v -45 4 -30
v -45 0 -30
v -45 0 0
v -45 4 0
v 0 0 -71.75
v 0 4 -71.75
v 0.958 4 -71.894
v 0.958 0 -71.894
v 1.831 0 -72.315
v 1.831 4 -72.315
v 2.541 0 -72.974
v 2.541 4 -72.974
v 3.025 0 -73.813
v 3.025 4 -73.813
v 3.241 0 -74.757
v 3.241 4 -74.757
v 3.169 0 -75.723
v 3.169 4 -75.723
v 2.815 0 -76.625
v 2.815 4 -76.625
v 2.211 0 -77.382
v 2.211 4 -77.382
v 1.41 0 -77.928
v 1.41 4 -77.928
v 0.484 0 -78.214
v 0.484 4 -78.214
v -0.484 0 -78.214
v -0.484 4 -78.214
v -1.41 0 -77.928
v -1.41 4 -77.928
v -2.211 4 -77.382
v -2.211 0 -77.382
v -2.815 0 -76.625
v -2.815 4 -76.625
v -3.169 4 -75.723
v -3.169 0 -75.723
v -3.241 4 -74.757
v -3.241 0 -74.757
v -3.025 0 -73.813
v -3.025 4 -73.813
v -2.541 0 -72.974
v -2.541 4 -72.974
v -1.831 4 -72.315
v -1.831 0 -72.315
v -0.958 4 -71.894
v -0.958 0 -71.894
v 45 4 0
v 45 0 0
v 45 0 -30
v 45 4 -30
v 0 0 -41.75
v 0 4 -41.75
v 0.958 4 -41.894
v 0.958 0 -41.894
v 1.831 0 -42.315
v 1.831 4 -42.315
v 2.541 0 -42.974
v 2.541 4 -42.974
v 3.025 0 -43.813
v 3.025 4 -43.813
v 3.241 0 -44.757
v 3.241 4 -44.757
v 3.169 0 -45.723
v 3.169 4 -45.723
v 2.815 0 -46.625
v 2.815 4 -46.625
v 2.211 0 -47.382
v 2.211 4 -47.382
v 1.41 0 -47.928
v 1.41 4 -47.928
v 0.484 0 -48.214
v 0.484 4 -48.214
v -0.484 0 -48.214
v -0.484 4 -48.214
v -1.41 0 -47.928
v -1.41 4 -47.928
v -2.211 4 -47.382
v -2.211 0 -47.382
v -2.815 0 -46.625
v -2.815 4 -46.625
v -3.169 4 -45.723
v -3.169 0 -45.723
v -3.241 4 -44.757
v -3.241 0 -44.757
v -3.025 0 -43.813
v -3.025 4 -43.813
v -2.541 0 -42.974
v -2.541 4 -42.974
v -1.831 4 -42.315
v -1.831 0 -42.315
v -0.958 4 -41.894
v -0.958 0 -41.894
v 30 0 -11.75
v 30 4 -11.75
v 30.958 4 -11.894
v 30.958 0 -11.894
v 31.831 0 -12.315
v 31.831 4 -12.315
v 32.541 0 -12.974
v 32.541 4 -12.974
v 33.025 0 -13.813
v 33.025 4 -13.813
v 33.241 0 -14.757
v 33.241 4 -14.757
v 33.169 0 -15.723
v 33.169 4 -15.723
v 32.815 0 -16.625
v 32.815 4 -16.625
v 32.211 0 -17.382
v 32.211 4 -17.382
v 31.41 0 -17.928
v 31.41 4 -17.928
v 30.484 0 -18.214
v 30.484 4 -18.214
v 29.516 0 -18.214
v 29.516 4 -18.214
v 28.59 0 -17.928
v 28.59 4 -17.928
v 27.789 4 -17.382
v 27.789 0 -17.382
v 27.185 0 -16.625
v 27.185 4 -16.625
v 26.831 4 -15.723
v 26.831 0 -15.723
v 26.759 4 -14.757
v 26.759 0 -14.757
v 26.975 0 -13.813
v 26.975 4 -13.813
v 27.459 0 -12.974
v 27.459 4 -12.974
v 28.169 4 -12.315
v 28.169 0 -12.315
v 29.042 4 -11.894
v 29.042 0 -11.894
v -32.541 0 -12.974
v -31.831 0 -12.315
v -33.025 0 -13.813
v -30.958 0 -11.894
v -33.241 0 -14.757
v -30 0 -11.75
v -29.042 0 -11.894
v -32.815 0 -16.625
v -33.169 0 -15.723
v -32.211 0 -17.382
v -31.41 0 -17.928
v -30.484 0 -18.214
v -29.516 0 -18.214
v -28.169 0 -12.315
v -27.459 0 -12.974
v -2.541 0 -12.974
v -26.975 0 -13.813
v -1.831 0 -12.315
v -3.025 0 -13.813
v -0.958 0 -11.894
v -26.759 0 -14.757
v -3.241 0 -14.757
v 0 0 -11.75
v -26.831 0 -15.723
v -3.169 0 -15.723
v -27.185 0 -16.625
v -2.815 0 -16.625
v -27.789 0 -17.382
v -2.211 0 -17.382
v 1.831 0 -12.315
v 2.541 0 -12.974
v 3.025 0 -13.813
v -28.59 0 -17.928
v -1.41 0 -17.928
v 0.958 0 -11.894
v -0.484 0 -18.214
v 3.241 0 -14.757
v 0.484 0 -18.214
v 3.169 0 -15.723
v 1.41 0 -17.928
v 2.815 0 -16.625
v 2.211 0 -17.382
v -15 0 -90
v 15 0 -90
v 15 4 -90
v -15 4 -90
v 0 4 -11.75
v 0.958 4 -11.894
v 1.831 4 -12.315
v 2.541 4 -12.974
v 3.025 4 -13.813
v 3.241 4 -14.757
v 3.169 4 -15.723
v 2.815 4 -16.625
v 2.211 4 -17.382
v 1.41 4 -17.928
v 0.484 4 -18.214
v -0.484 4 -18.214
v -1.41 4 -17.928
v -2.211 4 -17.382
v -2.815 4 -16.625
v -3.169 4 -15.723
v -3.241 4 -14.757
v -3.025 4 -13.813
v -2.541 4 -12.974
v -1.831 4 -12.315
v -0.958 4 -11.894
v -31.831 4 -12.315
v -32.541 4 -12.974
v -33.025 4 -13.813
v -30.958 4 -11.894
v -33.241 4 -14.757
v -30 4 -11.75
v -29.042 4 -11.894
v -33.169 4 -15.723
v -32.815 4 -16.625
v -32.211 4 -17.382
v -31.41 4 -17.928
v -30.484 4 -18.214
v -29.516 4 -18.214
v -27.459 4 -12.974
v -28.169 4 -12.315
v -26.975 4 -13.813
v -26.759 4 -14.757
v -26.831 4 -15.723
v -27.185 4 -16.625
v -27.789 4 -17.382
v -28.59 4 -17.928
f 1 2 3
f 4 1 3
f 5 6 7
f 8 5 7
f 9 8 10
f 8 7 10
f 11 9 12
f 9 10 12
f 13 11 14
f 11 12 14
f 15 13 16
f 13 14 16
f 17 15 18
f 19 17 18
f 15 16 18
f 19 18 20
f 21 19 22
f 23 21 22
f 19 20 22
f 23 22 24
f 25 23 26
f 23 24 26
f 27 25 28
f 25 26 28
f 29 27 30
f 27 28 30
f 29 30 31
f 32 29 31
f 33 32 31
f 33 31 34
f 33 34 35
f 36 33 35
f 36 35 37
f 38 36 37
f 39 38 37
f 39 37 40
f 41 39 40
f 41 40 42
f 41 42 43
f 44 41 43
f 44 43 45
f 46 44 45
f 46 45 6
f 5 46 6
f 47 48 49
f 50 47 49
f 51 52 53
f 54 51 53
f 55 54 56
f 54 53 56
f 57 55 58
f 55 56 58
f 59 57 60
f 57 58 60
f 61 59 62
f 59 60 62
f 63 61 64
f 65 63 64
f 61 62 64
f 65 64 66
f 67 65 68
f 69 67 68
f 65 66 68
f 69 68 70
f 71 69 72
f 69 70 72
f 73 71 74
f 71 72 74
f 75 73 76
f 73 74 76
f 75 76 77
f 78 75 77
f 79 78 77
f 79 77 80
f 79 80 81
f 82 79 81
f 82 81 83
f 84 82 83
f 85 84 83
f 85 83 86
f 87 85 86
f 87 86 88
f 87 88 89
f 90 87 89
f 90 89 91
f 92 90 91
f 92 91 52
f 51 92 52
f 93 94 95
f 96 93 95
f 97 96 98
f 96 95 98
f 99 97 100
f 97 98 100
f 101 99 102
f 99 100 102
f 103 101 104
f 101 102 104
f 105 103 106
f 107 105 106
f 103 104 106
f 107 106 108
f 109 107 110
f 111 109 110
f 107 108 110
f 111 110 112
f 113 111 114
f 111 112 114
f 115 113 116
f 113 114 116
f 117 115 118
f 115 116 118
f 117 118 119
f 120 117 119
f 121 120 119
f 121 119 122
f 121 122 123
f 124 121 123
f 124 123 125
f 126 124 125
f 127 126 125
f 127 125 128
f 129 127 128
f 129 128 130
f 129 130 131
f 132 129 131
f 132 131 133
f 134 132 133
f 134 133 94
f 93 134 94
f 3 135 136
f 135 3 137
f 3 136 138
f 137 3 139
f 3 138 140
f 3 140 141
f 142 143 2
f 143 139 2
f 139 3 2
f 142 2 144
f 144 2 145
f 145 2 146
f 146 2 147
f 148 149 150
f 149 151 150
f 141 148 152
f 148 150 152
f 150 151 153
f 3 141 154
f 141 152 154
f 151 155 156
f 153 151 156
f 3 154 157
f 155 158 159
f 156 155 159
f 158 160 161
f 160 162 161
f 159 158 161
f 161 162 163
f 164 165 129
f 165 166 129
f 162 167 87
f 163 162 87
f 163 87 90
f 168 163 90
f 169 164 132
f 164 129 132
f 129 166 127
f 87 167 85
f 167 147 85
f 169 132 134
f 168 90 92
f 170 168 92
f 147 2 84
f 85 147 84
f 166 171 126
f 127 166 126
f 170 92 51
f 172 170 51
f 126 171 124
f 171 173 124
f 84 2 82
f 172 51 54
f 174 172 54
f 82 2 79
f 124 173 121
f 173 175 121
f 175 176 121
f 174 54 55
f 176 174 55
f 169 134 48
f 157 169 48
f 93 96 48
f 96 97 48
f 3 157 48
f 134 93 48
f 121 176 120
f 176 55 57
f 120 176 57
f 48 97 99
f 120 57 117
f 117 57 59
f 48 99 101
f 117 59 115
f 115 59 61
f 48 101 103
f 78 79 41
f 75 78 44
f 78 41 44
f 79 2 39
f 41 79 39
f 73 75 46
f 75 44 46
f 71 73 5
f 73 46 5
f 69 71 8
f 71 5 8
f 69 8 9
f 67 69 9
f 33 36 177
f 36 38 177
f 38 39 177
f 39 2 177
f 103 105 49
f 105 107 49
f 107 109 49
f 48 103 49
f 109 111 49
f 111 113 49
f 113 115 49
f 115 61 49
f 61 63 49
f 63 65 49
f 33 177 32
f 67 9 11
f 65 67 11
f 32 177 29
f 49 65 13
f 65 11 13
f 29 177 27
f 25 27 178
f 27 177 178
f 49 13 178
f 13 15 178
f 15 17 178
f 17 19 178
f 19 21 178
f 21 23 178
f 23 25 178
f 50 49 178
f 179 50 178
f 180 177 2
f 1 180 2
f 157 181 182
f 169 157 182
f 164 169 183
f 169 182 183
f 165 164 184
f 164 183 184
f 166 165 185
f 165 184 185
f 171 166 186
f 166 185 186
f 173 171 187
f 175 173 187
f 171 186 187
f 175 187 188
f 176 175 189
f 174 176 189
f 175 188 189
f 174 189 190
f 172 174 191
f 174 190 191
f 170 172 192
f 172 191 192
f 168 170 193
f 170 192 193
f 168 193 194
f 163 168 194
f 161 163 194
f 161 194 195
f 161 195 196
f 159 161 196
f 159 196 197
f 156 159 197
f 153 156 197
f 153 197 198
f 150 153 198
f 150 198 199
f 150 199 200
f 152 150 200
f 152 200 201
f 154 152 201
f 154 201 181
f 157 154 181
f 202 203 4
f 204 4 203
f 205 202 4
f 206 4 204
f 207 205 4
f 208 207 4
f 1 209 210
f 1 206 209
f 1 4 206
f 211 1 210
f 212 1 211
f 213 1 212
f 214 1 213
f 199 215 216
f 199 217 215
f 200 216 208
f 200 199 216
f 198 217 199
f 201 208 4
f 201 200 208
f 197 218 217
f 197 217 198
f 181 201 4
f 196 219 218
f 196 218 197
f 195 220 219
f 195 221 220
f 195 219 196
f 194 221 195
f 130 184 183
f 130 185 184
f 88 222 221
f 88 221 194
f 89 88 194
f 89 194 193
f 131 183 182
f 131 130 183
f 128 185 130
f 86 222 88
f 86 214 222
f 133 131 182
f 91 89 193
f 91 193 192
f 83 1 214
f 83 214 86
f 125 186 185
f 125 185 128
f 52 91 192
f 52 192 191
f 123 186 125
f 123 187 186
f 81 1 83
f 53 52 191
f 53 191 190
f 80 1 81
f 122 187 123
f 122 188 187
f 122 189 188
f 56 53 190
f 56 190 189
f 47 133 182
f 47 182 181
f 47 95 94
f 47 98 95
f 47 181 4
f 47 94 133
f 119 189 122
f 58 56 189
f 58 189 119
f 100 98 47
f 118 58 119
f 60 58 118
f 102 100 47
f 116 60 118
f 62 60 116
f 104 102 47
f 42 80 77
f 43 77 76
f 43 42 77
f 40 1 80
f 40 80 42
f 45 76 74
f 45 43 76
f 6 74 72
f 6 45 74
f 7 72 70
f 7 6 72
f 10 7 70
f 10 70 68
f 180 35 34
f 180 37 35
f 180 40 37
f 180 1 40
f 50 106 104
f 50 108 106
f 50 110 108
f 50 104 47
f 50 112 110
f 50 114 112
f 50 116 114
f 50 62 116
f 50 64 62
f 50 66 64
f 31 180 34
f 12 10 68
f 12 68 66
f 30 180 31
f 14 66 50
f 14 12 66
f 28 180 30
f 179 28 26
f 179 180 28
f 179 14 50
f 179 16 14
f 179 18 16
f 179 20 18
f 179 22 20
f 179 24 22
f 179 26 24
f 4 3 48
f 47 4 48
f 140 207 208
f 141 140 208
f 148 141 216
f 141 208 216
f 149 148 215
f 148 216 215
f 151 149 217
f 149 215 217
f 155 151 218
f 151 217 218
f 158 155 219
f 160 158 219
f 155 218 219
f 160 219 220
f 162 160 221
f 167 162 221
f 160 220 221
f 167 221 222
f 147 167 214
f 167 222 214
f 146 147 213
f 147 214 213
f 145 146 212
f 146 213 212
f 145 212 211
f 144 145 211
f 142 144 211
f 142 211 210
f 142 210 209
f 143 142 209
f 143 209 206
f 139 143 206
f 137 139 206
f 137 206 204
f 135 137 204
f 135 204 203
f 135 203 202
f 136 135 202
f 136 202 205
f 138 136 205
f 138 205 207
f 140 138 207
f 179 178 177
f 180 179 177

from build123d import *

# Parameters (mm, degrees)
BOSS_EXTRUDE1_DEPTH = 4
SKETCH2_R           = 3.25
CUT_EXTRUDE1_DEPTH  = 101.702532242


with BuildPart() as part:
    # Sketch1 → Boss-Extrude1 (new body)
    with BuildSketch(Plane(origin=(0, 0, 0), x_dir=(1, 0, 0), z_dir=(0, 1, 0))):
        Polygon((-45, 0), (45, 0), (45, 30), (15, 90), (-15, 90), (-45, 30), align=None)
    extrude(amount=BOSS_EXTRUDE1_DEPTH)

    # Sketch2 → Cut-Extrude1 (cut, through all)
    with BuildSketch(Plane(origin=(0, 4, 0), x_dir=(1, 0, 0), z_dir=(0, 1, 0))):
        with Locations(Location((0, 75, 0), (0, 0, 270))):
            Circle(SKETCH2_R)
        with Locations(Location((0, 45, 0), (0, 0, 270))):
            Circle(SKETCH2_R)
        with Locations(Location((0, 15, 0), (0, 0, 270))):
            Circle(SKETCH2_R)
        with Locations(Location((30, 15, 0), (0, 0, 270))):
            Circle(SKETCH2_R)
        with Locations(Location((-30, 15, 0), (0, 0, 270))):
            Circle(SKETCH2_R)
    extrude(amount=-CUT_EXTRUDE1_DEPTH, mode=Mode.SUBTRACT)


solid = part.part
